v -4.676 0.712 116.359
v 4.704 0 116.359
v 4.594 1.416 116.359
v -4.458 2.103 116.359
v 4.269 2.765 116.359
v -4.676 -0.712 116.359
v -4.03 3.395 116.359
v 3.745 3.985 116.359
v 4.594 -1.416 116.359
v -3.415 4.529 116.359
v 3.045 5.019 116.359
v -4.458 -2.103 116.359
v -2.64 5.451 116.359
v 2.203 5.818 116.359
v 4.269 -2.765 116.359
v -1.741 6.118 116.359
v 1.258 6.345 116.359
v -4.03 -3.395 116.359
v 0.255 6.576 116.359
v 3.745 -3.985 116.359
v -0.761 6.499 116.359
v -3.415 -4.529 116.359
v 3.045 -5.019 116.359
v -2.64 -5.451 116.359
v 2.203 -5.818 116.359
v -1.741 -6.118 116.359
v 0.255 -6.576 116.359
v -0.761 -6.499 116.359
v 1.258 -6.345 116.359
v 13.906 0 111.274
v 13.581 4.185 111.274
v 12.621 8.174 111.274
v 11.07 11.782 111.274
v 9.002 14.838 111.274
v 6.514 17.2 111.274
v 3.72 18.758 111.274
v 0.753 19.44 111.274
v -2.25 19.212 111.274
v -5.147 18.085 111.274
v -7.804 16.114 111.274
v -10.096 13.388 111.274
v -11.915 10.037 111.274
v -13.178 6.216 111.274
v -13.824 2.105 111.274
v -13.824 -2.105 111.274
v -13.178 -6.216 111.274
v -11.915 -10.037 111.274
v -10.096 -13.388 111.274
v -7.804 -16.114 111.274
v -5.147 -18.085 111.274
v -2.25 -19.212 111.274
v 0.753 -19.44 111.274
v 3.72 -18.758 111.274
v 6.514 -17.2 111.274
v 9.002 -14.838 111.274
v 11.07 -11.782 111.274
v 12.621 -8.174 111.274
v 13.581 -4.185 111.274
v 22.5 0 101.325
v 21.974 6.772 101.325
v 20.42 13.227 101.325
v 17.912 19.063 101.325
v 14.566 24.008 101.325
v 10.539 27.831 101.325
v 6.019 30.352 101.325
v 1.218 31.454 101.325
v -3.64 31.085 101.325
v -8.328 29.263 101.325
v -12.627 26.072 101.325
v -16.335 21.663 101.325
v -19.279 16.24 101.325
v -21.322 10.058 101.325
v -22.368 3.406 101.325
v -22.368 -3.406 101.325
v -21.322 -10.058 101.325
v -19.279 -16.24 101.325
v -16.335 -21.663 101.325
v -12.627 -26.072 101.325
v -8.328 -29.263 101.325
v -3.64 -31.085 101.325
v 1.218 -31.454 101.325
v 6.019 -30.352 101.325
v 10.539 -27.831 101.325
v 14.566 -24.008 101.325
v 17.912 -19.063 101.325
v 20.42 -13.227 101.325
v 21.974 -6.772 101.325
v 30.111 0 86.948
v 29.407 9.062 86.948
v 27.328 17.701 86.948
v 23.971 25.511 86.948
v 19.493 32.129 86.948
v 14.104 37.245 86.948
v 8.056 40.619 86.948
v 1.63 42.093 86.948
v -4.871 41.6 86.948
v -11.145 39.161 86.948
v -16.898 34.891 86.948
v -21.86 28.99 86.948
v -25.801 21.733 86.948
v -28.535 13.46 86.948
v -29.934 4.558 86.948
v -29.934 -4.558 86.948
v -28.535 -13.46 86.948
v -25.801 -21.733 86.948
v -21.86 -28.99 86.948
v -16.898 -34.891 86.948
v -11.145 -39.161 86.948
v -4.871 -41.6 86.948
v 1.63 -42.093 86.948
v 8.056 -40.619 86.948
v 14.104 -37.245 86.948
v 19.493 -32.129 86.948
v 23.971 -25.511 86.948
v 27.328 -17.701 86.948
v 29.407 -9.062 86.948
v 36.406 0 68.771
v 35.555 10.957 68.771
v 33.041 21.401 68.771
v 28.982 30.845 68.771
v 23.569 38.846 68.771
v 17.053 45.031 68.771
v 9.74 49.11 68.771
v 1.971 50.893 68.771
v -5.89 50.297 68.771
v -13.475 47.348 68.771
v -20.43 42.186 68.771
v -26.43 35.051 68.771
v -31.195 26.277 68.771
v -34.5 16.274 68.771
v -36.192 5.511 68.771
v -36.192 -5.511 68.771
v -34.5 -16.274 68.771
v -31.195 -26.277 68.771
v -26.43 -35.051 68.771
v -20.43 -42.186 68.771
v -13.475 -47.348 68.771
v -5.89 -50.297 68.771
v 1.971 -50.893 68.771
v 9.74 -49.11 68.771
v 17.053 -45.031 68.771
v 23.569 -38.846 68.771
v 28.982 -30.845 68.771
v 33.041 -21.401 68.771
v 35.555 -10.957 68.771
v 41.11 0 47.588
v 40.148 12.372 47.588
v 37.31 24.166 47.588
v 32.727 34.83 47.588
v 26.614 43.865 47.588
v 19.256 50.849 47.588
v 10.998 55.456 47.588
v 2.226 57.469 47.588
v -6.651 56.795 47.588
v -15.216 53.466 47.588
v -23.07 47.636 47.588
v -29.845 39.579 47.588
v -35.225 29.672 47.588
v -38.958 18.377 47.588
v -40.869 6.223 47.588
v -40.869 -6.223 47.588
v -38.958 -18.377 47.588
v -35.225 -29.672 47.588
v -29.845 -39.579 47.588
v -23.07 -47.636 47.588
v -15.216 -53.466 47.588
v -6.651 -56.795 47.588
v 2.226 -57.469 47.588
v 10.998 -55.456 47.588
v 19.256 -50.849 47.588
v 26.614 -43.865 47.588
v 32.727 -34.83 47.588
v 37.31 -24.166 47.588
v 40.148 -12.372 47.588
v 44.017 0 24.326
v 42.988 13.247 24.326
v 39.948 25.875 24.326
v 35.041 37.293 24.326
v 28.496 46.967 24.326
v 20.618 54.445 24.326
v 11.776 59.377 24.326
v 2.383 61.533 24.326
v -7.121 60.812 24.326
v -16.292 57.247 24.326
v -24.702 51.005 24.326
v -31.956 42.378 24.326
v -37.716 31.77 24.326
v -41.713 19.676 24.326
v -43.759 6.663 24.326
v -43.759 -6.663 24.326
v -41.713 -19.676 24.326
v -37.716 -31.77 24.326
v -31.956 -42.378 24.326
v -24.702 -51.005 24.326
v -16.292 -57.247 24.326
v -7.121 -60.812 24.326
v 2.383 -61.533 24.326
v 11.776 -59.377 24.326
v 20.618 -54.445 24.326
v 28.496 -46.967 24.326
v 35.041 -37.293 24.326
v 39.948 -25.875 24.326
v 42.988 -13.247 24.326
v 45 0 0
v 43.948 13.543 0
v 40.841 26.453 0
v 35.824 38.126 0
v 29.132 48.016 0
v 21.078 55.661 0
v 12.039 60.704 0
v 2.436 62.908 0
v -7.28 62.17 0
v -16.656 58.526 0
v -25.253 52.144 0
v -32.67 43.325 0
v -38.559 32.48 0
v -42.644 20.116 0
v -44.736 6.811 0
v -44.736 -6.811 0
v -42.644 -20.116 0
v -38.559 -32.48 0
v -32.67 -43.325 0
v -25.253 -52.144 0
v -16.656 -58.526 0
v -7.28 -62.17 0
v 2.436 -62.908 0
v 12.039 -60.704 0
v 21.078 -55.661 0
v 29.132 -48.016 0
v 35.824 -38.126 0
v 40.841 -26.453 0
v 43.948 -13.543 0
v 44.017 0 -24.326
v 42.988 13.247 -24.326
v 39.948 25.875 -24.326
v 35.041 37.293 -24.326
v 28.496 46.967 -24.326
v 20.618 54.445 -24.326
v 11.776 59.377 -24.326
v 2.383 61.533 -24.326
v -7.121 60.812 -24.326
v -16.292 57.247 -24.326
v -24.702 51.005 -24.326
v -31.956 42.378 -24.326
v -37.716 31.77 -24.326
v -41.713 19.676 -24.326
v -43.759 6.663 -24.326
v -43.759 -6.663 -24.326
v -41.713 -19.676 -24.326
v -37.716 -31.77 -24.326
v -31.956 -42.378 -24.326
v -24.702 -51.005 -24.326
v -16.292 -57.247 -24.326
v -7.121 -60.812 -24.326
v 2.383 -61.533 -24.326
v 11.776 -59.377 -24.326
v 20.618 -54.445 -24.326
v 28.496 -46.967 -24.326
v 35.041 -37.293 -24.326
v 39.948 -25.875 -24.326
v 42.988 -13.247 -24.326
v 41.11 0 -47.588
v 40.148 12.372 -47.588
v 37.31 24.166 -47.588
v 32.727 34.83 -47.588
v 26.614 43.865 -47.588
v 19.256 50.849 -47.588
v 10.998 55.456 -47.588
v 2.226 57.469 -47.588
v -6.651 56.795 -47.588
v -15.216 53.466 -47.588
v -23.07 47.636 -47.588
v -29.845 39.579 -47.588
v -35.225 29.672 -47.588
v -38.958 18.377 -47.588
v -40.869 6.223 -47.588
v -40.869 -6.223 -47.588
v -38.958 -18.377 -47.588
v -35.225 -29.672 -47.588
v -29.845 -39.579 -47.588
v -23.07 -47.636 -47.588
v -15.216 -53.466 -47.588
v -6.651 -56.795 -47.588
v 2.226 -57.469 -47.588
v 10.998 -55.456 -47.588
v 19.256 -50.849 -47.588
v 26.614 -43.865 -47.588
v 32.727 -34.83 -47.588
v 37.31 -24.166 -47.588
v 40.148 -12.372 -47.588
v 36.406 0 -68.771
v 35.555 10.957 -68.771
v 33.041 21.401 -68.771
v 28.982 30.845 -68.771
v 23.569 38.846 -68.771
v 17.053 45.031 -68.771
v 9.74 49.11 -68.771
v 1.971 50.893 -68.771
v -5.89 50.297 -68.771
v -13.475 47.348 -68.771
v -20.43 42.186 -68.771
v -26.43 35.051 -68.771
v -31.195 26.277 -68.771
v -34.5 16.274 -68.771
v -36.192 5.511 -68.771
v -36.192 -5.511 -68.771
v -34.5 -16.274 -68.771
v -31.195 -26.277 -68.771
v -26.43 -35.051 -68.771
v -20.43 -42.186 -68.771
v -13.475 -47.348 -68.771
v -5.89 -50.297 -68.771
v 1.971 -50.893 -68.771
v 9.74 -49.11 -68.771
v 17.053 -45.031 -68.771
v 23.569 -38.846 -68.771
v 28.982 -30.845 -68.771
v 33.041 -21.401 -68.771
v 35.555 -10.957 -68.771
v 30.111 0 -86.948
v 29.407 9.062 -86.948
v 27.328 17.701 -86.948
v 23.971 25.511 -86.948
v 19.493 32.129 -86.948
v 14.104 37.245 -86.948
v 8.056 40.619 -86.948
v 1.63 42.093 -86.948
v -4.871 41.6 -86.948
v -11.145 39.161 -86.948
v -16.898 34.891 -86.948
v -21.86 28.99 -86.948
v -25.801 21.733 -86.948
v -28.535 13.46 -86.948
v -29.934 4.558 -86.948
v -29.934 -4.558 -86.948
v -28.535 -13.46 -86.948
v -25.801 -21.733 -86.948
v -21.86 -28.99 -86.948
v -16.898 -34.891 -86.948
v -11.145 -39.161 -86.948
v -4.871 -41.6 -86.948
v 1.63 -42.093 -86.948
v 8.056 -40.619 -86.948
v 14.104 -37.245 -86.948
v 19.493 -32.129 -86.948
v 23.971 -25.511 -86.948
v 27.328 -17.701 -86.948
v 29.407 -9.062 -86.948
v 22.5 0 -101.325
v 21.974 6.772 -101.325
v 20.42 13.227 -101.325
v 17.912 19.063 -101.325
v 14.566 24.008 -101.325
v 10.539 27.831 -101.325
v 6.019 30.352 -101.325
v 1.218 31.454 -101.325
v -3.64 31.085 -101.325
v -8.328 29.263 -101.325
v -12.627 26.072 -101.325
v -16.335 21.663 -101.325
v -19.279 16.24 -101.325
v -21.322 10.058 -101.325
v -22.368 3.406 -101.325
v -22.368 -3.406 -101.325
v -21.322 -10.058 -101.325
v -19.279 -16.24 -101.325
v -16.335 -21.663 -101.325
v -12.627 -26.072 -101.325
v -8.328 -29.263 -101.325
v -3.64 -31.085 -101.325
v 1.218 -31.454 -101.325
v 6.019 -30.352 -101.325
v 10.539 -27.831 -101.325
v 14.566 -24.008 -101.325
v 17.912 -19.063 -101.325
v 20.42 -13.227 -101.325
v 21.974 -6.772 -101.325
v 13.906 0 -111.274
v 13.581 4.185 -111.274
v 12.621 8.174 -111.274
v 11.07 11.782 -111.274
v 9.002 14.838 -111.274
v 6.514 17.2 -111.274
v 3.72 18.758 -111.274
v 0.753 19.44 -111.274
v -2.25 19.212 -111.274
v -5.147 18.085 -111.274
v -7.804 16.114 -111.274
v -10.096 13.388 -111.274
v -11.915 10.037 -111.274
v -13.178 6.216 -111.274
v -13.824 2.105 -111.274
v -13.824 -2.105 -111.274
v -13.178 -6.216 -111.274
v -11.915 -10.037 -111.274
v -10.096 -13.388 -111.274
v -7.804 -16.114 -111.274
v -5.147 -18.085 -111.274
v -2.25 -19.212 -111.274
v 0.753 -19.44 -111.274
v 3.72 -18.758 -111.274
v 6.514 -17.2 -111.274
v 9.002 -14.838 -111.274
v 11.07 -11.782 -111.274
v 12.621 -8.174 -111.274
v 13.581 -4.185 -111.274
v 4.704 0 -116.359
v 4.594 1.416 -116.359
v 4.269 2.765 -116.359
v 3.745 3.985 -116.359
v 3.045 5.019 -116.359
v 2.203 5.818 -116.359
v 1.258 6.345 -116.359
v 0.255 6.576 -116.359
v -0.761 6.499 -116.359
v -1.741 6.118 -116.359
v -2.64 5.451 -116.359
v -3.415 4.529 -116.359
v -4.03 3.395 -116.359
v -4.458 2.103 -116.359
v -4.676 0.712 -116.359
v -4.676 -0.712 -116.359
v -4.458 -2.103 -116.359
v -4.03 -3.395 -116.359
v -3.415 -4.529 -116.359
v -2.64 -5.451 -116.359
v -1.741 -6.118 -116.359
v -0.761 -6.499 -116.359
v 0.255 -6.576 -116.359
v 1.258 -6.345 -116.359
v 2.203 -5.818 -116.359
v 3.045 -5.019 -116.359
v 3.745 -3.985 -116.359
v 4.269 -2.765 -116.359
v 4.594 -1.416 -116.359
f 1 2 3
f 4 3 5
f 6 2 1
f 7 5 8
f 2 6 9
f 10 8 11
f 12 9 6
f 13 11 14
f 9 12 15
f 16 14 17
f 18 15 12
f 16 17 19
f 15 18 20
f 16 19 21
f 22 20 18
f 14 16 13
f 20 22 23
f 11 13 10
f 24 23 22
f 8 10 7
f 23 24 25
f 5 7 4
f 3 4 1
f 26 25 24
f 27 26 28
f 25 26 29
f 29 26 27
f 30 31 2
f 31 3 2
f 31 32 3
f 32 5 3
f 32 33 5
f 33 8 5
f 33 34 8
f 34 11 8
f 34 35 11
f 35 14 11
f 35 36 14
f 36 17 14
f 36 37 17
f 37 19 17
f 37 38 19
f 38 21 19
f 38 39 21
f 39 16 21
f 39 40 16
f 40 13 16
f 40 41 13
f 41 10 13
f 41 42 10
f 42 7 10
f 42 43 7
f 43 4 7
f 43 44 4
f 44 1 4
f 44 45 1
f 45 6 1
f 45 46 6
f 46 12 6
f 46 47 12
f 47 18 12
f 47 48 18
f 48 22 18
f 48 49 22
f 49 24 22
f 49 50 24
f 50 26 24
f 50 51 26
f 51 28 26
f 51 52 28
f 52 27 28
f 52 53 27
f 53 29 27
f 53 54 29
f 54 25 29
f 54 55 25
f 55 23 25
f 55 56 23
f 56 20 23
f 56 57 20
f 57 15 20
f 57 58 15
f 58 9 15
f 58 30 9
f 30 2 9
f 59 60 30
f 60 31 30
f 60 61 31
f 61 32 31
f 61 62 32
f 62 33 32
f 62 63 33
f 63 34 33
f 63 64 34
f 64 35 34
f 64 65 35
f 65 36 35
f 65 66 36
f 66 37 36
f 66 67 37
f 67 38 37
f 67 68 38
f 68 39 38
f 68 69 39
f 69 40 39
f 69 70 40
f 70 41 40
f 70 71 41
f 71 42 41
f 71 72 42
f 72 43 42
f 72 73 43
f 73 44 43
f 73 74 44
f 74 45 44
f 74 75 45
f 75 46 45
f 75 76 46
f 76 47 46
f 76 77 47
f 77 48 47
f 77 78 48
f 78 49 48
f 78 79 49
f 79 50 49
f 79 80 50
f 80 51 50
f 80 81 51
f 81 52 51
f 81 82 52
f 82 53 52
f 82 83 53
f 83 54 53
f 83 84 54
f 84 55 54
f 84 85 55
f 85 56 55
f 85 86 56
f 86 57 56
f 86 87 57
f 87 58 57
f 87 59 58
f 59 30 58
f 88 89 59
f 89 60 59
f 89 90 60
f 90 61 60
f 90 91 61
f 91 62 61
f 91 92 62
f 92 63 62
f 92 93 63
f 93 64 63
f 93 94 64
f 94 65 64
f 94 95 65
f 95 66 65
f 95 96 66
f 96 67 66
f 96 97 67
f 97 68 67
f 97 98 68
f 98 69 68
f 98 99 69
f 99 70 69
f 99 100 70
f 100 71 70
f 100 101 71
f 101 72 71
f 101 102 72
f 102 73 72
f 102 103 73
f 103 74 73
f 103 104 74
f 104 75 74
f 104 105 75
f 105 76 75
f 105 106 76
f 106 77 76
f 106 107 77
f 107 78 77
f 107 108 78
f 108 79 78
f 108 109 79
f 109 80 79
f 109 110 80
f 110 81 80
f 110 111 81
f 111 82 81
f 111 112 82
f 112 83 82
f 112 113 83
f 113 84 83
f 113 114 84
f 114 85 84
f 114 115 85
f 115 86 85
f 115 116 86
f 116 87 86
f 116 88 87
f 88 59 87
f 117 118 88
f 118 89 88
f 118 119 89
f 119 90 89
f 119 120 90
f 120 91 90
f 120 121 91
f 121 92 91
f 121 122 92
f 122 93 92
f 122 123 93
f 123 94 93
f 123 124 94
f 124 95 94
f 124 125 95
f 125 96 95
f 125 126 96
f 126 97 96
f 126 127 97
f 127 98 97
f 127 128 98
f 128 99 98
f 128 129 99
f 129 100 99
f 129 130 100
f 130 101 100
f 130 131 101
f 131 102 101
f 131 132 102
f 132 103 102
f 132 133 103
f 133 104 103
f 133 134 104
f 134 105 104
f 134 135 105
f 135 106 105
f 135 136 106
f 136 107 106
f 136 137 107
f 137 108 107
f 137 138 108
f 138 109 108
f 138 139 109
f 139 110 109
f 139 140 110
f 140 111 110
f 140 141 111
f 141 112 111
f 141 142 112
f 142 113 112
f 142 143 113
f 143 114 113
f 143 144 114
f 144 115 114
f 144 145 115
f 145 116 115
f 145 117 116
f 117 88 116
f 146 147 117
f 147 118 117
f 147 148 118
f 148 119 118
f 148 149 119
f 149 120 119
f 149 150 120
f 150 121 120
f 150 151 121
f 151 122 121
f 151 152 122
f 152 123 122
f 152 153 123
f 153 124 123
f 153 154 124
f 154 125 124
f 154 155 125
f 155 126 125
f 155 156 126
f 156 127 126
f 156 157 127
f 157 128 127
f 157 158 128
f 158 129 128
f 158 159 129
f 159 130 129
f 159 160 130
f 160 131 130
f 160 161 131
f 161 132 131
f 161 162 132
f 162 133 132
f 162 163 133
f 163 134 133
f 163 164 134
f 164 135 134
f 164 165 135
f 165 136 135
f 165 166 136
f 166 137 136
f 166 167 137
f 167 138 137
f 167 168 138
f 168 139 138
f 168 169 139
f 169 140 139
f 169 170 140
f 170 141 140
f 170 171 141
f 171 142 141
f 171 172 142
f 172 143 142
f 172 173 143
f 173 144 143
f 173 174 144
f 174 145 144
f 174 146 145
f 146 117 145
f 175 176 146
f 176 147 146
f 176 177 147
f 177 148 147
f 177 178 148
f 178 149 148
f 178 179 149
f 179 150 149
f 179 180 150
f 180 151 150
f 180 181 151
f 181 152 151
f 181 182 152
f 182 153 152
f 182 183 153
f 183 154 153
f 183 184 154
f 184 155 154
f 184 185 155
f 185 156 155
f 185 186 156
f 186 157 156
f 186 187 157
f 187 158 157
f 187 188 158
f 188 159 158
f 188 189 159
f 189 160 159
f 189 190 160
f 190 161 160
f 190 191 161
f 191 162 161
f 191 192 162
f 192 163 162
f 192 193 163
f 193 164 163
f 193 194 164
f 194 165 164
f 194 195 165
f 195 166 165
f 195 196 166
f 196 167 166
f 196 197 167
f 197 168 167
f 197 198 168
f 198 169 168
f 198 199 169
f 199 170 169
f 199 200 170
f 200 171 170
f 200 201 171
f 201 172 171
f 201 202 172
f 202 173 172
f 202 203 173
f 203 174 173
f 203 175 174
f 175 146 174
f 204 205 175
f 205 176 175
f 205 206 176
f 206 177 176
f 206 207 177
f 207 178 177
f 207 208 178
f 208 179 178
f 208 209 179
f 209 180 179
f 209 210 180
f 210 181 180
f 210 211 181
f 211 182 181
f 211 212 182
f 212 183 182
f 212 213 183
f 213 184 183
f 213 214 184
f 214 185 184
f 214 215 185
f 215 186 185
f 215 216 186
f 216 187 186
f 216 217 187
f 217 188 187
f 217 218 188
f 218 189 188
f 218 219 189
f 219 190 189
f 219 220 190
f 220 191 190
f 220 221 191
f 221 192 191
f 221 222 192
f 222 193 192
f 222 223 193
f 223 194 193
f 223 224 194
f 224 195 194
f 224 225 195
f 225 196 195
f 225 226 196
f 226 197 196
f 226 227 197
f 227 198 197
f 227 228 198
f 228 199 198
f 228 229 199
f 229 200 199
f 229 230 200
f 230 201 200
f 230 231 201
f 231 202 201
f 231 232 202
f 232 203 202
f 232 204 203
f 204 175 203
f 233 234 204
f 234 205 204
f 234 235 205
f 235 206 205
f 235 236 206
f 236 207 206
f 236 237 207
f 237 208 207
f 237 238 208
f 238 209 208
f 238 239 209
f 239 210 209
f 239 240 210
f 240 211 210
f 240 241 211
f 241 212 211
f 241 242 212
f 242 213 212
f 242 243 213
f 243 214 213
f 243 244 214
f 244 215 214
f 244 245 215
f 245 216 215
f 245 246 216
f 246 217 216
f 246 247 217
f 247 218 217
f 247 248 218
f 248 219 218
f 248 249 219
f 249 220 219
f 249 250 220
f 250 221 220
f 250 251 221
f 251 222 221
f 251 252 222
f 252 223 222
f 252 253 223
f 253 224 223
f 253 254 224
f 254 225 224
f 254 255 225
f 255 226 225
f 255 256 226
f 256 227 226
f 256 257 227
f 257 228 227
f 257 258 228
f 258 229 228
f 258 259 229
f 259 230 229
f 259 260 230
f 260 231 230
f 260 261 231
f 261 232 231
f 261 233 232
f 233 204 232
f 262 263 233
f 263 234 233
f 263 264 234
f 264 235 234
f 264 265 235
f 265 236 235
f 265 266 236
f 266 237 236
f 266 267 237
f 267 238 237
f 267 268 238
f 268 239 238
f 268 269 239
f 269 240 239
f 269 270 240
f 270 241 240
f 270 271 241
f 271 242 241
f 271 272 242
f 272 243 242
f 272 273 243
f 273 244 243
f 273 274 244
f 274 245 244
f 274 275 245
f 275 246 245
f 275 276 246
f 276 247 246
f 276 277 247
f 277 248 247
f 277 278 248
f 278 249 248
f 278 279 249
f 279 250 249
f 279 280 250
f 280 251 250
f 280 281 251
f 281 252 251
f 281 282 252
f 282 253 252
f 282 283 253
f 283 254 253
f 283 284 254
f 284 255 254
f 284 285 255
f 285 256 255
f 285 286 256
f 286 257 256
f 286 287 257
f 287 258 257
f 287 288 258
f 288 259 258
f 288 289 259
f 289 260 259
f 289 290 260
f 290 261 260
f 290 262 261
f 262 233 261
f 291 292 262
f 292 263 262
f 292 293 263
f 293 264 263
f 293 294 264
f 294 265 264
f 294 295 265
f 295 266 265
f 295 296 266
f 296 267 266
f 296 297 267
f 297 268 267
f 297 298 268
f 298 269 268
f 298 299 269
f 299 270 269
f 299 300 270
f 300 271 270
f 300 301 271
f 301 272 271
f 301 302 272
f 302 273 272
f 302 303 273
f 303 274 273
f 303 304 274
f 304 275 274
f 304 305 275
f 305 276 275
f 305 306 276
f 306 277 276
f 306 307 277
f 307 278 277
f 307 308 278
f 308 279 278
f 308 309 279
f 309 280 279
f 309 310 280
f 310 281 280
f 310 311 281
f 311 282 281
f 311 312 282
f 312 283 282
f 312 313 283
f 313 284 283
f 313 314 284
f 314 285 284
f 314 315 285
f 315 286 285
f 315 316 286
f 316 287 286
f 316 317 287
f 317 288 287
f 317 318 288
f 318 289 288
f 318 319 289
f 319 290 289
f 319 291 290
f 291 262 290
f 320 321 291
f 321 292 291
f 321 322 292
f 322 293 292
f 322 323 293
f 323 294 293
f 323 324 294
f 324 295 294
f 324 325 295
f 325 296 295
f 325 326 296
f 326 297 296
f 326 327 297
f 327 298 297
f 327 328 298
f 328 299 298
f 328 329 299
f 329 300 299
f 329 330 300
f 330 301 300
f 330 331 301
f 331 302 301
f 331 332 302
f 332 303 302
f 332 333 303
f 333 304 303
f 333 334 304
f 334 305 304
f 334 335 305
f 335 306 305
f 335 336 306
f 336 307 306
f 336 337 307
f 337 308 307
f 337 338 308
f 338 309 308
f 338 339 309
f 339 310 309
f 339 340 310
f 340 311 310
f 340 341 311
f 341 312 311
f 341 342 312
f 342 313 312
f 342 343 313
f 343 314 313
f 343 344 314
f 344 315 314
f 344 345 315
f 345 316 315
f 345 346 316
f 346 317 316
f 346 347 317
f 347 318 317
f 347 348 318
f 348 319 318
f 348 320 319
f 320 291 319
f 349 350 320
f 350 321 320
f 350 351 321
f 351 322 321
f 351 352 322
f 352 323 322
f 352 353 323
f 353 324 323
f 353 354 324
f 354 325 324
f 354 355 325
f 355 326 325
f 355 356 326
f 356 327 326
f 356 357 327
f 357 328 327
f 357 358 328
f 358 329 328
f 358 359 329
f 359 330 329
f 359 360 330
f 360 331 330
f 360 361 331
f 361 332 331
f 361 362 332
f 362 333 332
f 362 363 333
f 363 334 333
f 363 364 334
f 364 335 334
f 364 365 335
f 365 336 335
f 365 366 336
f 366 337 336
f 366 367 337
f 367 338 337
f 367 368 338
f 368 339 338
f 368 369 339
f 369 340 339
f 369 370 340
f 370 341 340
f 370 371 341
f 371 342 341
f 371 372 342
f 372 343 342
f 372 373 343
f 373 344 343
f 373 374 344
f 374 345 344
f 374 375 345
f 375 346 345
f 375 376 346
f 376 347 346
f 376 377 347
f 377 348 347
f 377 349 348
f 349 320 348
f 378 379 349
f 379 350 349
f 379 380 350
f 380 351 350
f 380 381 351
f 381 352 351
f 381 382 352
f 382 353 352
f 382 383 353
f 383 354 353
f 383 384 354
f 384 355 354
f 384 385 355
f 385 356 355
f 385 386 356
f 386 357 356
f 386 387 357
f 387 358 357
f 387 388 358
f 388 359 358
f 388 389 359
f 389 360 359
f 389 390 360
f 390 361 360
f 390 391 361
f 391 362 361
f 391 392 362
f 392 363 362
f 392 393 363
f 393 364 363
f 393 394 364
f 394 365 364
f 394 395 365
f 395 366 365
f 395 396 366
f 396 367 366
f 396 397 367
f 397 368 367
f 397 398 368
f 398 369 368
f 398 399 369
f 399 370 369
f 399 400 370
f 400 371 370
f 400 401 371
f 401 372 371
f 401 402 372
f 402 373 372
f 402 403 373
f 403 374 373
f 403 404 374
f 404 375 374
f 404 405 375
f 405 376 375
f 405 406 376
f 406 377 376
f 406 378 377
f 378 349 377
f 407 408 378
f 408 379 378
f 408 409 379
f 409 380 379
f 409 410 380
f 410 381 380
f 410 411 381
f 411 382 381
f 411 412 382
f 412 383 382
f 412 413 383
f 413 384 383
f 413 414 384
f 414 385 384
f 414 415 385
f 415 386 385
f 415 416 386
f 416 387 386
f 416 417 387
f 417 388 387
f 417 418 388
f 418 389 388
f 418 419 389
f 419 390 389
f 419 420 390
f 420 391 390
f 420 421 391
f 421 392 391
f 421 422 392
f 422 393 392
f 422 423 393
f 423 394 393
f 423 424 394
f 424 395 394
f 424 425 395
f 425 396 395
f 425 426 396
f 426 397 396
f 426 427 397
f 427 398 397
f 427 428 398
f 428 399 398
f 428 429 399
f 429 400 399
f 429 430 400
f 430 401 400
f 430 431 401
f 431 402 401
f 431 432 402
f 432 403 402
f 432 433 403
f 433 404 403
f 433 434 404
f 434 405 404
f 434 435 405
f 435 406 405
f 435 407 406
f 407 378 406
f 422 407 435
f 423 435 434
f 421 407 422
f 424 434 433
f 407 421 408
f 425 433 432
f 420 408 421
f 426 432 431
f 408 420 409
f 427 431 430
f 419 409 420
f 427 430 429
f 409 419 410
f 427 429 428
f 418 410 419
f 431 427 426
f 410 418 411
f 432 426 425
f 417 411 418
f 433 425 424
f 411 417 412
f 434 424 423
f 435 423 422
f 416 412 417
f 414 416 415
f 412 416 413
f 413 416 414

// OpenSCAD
// Generated by SolidPython 1.0.1 on 2020-07-29 00:46:46


scale(v = [5, 7, 13]) {
	sphere(r = 9);
}
/***********************************************
*********      SolidPython code:      **********
************************************************
 
# import packages: SolidPython
from solid import *
from solid.utils import *
from itertools import chain, combinations, permutations


class Resize:

    def __init__(self, scad_file):
        self.scad_file = scad_file
        #self.scad_file = import_scad(scad_file)
        # cone/cylinder param:
        self.r1 = 0
        self.r2 = 0
        self.h = 0
        # rectangular prism param:
        self.w = 0
        self.l = 0
        # ellipse param:
        self.r = 0

    # import OpenScad code (file name corresponds to shape)


    # classify shape + parameters
    def assign(self, param1, param2, param3):
        if self.scad_file == 'cone.scad':
            self.r1 = param1
            self.r2 = param2
            self.h = param3
        elif self.scad_file == 'cylinder.scad':
            self.r1 = param1
            self.r2 = param2
            self.h = param3
        elif self.scad_file == 'rectangularPrism.scad':
            self.h = param1
            self.l = param2
            self.w = param3
        else:
            self.r = param1
            self.h = param2

    # resize parameters
    def iterate(self):
        x = range(3, 20, 2)
        i = 1
        if self.scad_file == 'cone.scad':
            tempList = list(permutations(x, 2))
            for temp in tempList:
                param1 = temp[0]
                param2 = temp[1]
                filepath = 'produced_scad_files/' + 'cone' + str(param1) + '_' + str(param2) + '_' + '.scad'
                scad_render_to_file(cylinder(h=param1, r1=param2, r2=0), filepath)

        elif self.scad_file == 'cylinder.scad':
            tempList = list(permutations(x, 3))
            for temp in tempList:
                param1 = temp[0]
                param2 = temp[1]
                filepath = 'produced_scad_files/' + 'cylinder' + str(param1) + '_' + str(param2) + '_' + '.scad'
                scad_render_to_file(cylinder(h=param1, r1=param2, r2=param2), filepath)

        elif self.scad_file == 'rectangularPrism.scad':
            tempList = list(permutations(x, 3))
            for temp in tempList:
                param1 = temp[0]
                param2 = temp[1]
                param3 = temp[2]
                filepath = 'produced_scad_files/' + 'rectangularPrism' + str(param1) + '_' + str(param2) + '_' + str(
                    param3) + '.scad'
                scad_render_to_file(cube(size=(param1, param2, param3)), filepath)

        elif self.scad_file == 'ellipse.scad':
            tempList = list(permutations(x, 4))
            for temp in tempList:
                param1 = temp[0]
                param2 = temp[1]
                param3 = temp[2]
                param4 = temp[3]
                filepath = 'produced_scad_files/' + 'ellipse' + str(param1) + '_' + str(param2) + '_' + str(param3) + '_' + str(param4) + '.scad'
                scad_render_to_file(scale([param1, param2, param3])(sphere(r=param4)), filepath)

    def render_to_scadfile(self):
        scad_render_to_file(scad, 'example.scad') 
 
************************************************/
